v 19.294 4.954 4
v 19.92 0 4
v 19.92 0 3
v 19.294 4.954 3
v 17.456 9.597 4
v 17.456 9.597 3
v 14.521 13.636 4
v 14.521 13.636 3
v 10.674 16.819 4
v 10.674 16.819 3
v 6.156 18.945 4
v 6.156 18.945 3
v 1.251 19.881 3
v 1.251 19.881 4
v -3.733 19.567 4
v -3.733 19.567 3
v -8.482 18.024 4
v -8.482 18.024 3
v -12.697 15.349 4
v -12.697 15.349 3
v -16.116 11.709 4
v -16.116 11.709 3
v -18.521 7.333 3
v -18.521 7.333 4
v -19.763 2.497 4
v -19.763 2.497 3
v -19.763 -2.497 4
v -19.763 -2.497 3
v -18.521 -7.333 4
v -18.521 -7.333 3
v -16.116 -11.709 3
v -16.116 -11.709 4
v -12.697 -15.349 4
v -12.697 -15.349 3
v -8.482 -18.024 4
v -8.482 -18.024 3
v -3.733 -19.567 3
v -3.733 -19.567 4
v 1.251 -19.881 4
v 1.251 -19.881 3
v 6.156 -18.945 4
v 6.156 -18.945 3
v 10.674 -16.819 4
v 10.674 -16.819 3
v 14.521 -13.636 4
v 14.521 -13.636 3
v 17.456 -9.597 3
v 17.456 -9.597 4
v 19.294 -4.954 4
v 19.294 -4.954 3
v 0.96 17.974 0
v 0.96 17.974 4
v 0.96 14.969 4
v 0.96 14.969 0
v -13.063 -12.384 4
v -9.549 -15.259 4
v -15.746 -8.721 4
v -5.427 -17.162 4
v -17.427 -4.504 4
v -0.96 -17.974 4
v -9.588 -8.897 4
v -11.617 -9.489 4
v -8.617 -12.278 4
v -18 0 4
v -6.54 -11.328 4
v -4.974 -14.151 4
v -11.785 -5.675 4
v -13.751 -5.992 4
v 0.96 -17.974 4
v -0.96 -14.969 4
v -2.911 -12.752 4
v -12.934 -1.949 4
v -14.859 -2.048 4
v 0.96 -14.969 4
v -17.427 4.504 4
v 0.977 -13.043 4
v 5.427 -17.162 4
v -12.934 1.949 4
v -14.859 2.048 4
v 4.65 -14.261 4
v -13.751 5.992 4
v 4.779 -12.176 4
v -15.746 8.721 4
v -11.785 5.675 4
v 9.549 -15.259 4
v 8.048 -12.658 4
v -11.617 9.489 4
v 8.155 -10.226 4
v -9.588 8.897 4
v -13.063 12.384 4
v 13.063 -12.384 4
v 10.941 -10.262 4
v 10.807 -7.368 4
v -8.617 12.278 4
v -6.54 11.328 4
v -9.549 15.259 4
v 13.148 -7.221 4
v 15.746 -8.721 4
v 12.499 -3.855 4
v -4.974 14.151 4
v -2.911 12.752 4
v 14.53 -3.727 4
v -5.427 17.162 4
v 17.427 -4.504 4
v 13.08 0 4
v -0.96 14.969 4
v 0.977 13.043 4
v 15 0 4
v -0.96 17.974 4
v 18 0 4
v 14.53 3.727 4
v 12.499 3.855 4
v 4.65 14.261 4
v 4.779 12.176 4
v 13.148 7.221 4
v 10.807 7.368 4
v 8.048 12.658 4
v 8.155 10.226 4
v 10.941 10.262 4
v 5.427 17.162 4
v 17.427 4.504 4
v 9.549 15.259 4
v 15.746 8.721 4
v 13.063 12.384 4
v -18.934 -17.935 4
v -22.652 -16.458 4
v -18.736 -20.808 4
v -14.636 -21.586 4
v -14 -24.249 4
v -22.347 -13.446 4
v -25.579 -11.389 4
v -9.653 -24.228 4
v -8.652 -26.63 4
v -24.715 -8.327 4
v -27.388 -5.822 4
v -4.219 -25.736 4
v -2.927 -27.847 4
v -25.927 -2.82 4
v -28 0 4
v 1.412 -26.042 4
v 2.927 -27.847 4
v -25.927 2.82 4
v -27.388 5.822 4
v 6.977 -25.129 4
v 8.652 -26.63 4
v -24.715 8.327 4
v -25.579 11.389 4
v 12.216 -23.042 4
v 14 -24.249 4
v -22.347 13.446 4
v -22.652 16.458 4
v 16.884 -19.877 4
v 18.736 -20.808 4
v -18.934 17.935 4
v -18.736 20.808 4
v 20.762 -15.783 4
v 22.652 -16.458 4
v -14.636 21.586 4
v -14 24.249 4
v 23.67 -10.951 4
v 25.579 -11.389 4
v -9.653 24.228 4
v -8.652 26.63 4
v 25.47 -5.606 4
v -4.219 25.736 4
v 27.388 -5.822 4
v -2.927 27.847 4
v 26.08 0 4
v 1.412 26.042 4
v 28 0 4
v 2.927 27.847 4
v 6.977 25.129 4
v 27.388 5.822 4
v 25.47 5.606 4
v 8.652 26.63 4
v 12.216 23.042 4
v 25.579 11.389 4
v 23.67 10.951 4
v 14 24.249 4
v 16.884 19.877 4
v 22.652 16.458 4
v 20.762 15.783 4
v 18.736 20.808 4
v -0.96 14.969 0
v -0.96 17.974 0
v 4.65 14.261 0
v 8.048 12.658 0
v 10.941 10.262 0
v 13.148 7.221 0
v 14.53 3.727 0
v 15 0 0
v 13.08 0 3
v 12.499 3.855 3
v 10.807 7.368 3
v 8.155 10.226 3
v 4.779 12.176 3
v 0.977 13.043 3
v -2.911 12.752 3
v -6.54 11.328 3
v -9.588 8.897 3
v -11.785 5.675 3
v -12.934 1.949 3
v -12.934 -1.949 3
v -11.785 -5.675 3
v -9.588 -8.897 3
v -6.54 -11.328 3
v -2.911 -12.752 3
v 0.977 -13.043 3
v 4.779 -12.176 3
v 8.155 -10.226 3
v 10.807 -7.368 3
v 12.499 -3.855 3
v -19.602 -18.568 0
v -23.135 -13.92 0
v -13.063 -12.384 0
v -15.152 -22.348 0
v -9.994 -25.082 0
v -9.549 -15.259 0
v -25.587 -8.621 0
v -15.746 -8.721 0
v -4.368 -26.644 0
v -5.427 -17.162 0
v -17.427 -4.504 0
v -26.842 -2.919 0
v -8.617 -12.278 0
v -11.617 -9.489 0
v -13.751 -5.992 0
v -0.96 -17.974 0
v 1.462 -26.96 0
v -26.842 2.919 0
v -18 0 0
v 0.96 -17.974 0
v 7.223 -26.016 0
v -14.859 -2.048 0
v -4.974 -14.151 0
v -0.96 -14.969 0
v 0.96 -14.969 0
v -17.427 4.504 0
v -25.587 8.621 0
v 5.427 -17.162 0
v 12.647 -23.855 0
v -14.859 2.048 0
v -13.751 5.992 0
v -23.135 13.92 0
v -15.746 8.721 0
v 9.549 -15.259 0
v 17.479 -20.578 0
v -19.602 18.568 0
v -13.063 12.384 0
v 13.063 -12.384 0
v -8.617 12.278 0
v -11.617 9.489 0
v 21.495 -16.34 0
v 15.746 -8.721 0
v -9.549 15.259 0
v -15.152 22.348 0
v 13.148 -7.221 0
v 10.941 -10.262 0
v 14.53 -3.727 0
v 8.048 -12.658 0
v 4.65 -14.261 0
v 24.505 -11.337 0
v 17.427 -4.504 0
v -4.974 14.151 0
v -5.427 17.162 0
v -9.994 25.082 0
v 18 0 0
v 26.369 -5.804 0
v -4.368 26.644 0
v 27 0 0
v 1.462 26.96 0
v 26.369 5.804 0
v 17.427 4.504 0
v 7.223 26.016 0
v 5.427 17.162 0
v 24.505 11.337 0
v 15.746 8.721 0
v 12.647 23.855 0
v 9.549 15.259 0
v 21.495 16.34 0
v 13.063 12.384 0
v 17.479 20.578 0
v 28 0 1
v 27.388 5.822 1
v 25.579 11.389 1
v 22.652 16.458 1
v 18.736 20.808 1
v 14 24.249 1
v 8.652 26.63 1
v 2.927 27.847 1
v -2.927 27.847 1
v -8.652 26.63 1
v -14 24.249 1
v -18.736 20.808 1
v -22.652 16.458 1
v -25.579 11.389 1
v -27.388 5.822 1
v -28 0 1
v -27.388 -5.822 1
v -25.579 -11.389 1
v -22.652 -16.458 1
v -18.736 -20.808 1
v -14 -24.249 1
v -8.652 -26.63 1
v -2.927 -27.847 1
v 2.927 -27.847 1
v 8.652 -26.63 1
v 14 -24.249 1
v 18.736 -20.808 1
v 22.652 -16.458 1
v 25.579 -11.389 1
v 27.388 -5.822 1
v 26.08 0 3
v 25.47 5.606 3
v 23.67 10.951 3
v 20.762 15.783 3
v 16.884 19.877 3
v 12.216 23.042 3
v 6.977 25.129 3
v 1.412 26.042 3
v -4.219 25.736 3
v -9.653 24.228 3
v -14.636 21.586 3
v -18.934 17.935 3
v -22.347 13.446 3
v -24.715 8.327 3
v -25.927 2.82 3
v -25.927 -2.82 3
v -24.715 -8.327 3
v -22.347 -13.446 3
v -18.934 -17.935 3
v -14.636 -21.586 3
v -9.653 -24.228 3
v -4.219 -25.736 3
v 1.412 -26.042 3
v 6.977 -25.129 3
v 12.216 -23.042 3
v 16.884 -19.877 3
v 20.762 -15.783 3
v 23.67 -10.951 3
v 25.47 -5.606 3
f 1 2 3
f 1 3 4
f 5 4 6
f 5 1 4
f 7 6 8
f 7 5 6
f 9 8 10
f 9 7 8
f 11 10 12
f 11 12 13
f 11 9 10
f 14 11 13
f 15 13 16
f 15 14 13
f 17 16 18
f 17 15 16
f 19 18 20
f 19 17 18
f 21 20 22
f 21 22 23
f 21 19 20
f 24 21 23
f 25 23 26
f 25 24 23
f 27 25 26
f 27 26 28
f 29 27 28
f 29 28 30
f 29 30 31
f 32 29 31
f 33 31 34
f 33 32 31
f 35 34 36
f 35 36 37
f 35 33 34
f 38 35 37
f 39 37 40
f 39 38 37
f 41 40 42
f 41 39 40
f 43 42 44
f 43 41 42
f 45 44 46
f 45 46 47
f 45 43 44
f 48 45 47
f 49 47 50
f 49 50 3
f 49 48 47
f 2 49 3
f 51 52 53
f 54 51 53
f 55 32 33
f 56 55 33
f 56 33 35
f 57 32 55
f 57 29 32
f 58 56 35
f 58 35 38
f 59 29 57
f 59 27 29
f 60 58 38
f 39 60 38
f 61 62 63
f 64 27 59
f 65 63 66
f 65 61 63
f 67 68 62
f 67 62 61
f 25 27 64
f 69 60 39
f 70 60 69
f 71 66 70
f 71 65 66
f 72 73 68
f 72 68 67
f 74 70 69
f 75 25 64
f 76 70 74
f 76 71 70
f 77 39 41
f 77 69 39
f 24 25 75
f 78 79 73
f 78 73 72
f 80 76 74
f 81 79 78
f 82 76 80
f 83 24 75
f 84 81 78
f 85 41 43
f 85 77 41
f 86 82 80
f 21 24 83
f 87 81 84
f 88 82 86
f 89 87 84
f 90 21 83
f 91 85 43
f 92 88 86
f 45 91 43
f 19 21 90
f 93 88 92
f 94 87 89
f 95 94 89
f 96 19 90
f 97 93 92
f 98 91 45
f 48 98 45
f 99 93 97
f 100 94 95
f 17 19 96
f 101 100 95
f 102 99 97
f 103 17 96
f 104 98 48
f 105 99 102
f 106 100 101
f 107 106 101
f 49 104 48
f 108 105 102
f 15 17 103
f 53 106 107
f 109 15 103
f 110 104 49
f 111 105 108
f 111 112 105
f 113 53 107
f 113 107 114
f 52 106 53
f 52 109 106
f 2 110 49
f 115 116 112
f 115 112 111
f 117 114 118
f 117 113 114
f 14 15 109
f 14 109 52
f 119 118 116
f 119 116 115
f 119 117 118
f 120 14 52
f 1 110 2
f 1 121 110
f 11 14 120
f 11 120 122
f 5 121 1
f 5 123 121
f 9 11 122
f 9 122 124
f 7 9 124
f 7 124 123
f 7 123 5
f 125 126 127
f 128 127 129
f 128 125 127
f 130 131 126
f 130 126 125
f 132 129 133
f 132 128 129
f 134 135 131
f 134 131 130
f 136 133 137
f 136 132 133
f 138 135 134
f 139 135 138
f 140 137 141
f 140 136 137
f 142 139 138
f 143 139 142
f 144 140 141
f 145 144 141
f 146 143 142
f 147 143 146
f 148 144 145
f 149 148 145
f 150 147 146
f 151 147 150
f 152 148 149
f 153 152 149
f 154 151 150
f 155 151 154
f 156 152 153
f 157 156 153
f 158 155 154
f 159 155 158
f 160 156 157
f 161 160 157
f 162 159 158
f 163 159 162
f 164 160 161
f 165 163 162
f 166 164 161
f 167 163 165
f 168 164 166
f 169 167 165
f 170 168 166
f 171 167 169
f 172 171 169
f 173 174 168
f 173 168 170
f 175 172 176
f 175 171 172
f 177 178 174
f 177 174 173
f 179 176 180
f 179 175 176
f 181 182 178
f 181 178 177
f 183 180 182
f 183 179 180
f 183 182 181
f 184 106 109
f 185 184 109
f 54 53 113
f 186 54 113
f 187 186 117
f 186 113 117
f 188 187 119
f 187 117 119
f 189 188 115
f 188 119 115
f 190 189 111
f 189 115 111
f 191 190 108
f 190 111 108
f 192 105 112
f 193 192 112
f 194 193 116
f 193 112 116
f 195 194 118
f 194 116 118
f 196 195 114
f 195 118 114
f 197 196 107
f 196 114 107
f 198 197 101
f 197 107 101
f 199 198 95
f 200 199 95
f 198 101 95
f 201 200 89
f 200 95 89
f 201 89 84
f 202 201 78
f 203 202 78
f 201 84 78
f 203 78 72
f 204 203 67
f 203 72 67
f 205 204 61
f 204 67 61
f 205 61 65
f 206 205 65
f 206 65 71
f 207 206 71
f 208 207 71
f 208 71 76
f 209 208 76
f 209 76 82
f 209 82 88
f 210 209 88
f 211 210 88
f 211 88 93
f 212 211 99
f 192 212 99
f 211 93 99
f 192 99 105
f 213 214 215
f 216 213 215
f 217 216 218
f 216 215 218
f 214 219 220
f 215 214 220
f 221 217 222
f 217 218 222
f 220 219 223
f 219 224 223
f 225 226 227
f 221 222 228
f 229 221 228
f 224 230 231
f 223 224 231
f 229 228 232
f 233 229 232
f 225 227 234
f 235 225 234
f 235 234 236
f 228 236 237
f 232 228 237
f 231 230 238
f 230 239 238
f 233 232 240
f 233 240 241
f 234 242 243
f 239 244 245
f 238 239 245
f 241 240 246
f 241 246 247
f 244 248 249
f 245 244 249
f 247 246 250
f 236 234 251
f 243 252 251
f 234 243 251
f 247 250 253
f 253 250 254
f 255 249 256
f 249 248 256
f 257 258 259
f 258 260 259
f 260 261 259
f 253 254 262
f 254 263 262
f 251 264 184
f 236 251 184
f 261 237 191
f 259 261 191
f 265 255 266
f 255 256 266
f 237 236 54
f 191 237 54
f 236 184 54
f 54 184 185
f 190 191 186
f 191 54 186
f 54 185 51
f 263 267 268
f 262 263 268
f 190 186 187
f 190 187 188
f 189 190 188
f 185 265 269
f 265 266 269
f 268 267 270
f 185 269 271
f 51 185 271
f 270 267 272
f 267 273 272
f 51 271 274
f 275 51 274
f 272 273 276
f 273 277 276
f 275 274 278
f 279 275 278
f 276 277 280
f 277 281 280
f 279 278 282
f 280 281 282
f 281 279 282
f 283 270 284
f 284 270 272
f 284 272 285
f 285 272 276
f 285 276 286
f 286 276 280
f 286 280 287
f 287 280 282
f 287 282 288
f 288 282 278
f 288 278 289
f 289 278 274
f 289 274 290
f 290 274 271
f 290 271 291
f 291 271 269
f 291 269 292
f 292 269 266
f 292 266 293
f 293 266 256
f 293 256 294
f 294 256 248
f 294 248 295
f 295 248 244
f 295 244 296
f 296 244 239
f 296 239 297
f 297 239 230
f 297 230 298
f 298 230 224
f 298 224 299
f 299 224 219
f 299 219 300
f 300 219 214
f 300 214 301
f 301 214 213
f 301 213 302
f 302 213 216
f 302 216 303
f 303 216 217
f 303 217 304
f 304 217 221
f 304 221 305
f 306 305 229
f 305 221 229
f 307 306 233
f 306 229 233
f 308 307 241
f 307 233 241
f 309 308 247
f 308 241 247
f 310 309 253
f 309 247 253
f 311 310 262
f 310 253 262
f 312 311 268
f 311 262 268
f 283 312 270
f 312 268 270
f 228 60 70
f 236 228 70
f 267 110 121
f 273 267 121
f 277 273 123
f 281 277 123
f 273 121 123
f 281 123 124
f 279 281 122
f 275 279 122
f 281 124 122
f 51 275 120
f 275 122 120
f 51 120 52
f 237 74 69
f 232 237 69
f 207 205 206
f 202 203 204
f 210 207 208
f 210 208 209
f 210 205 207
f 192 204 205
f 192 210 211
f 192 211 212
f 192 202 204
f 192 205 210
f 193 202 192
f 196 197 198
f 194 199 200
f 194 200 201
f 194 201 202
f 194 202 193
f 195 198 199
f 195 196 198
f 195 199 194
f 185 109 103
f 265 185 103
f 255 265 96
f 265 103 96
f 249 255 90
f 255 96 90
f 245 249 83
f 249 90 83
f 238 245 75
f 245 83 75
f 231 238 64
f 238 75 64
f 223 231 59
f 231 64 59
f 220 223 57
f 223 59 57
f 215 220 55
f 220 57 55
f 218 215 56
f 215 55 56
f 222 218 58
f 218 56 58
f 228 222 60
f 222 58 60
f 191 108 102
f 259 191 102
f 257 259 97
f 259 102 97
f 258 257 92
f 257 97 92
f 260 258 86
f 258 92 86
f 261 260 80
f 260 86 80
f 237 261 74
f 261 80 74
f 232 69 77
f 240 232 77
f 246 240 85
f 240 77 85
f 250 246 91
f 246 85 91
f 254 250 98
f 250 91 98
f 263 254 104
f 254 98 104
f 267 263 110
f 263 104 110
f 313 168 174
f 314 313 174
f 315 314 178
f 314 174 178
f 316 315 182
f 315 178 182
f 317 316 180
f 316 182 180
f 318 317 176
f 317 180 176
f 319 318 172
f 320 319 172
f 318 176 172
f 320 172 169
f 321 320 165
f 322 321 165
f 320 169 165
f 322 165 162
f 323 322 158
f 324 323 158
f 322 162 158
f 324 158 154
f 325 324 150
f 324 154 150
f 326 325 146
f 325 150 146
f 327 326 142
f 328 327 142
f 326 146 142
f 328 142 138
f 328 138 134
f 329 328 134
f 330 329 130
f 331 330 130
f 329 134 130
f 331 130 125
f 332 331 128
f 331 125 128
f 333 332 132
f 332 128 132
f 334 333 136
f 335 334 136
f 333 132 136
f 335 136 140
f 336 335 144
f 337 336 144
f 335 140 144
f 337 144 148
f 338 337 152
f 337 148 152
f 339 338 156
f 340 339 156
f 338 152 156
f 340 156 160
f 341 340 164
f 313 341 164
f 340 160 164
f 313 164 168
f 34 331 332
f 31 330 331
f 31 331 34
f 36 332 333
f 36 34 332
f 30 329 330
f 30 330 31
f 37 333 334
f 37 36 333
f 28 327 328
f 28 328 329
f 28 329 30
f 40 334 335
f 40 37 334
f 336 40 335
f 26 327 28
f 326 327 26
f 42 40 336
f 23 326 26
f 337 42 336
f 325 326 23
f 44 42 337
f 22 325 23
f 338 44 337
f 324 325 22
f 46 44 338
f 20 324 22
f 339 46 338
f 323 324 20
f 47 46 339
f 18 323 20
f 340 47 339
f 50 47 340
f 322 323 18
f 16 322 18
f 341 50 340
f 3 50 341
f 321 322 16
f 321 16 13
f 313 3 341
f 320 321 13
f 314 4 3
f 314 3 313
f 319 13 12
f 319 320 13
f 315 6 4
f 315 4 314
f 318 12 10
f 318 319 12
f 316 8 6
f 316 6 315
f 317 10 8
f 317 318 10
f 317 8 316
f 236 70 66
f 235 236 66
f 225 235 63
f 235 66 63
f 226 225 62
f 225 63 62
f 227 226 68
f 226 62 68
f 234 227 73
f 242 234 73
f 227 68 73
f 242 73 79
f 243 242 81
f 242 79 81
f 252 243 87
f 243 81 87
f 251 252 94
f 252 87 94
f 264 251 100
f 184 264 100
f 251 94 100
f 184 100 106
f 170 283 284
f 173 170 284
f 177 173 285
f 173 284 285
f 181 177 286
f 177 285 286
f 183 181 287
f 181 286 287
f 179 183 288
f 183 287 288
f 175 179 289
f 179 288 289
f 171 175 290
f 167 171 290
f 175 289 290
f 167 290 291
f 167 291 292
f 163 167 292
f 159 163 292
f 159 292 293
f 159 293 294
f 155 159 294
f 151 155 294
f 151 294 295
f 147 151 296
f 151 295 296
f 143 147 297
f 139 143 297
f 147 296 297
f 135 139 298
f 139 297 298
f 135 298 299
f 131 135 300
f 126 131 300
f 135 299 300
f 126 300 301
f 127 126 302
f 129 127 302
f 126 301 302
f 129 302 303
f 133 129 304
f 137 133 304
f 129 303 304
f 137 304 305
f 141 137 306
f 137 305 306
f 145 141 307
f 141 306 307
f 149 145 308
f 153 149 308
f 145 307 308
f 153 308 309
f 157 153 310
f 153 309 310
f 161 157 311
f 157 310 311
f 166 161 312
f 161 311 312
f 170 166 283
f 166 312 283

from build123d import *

# Parameters (mm, degrees)
F0_R     = 28
F1_DEPTH = 4
F3_DEPTH = 4
F4_R     = 26.08
F4_R_2   = 19.92
F4_R_3   = 13.08
F5_DEPTH = 1
F6_SIZE  = 1


with BuildPart() as f1:
    # F0 (on Top) → F1 (new body)
    with BuildSketch(Plane.XY):
        Circle(F0_R)
    extrude(amount=F1_DEPTH)

    # F2 (on face) → F3 (cut, through all)
    with BuildSketch(Plane.XY.offset(4)):
        with BuildLine():
            ThreePointArc((-0.96, -14.969248), (-15, 0), (-0.96, 14.969248))
            Line((-0.96, 14.969248), (-0.96, 17.974382))
            ThreePointArc((-0.96, 17.974382), (-18, 0), (-0.96, -17.974382))
            Line((-0.96, -17.974382), (-0.96, -14.969248))
        make_face()
        with BuildLine():
            ThreePointArc((0.96, 14.969248), (10.94075, 10.261579), (15, 0))
            ThreePointArc((15, 0), (10.94075, -10.261579), (0.96, -14.969248))
            Line((0.96, -14.969248), (0.96, -17.974382))
            ThreePointArc((0.96, -17.974382), (13.062925, -12.38386), (18, 0))
            ThreePointArc((18, 0), (13.062925, 12.38386), (0.96, 17.974382))
            Line((0.96, 17.974382), (0.96, 14.969248))
        make_face()
    extrude(amount=-F3_DEPTH, mode=Mode.SUBTRACT)

    # F4 (on face) → F5 (cut)
    with BuildSketch(Plane.XY.offset(4)):
        Circle(F4_R)
        Circle(F4_R_2, mode=Mode.SUBTRACT)
        Circle(F4_R_3)
    extrude(amount=-F5_DEPTH, mode=Mode.SUBTRACT)

    # F6
    f6_edges = [f1.edges().sort_by_distance(p)[0] for p in [
        (-28, 0, 0),
    ]]
    chamfer(f6_edges, length=F6_SIZE)


solid = f1.part
